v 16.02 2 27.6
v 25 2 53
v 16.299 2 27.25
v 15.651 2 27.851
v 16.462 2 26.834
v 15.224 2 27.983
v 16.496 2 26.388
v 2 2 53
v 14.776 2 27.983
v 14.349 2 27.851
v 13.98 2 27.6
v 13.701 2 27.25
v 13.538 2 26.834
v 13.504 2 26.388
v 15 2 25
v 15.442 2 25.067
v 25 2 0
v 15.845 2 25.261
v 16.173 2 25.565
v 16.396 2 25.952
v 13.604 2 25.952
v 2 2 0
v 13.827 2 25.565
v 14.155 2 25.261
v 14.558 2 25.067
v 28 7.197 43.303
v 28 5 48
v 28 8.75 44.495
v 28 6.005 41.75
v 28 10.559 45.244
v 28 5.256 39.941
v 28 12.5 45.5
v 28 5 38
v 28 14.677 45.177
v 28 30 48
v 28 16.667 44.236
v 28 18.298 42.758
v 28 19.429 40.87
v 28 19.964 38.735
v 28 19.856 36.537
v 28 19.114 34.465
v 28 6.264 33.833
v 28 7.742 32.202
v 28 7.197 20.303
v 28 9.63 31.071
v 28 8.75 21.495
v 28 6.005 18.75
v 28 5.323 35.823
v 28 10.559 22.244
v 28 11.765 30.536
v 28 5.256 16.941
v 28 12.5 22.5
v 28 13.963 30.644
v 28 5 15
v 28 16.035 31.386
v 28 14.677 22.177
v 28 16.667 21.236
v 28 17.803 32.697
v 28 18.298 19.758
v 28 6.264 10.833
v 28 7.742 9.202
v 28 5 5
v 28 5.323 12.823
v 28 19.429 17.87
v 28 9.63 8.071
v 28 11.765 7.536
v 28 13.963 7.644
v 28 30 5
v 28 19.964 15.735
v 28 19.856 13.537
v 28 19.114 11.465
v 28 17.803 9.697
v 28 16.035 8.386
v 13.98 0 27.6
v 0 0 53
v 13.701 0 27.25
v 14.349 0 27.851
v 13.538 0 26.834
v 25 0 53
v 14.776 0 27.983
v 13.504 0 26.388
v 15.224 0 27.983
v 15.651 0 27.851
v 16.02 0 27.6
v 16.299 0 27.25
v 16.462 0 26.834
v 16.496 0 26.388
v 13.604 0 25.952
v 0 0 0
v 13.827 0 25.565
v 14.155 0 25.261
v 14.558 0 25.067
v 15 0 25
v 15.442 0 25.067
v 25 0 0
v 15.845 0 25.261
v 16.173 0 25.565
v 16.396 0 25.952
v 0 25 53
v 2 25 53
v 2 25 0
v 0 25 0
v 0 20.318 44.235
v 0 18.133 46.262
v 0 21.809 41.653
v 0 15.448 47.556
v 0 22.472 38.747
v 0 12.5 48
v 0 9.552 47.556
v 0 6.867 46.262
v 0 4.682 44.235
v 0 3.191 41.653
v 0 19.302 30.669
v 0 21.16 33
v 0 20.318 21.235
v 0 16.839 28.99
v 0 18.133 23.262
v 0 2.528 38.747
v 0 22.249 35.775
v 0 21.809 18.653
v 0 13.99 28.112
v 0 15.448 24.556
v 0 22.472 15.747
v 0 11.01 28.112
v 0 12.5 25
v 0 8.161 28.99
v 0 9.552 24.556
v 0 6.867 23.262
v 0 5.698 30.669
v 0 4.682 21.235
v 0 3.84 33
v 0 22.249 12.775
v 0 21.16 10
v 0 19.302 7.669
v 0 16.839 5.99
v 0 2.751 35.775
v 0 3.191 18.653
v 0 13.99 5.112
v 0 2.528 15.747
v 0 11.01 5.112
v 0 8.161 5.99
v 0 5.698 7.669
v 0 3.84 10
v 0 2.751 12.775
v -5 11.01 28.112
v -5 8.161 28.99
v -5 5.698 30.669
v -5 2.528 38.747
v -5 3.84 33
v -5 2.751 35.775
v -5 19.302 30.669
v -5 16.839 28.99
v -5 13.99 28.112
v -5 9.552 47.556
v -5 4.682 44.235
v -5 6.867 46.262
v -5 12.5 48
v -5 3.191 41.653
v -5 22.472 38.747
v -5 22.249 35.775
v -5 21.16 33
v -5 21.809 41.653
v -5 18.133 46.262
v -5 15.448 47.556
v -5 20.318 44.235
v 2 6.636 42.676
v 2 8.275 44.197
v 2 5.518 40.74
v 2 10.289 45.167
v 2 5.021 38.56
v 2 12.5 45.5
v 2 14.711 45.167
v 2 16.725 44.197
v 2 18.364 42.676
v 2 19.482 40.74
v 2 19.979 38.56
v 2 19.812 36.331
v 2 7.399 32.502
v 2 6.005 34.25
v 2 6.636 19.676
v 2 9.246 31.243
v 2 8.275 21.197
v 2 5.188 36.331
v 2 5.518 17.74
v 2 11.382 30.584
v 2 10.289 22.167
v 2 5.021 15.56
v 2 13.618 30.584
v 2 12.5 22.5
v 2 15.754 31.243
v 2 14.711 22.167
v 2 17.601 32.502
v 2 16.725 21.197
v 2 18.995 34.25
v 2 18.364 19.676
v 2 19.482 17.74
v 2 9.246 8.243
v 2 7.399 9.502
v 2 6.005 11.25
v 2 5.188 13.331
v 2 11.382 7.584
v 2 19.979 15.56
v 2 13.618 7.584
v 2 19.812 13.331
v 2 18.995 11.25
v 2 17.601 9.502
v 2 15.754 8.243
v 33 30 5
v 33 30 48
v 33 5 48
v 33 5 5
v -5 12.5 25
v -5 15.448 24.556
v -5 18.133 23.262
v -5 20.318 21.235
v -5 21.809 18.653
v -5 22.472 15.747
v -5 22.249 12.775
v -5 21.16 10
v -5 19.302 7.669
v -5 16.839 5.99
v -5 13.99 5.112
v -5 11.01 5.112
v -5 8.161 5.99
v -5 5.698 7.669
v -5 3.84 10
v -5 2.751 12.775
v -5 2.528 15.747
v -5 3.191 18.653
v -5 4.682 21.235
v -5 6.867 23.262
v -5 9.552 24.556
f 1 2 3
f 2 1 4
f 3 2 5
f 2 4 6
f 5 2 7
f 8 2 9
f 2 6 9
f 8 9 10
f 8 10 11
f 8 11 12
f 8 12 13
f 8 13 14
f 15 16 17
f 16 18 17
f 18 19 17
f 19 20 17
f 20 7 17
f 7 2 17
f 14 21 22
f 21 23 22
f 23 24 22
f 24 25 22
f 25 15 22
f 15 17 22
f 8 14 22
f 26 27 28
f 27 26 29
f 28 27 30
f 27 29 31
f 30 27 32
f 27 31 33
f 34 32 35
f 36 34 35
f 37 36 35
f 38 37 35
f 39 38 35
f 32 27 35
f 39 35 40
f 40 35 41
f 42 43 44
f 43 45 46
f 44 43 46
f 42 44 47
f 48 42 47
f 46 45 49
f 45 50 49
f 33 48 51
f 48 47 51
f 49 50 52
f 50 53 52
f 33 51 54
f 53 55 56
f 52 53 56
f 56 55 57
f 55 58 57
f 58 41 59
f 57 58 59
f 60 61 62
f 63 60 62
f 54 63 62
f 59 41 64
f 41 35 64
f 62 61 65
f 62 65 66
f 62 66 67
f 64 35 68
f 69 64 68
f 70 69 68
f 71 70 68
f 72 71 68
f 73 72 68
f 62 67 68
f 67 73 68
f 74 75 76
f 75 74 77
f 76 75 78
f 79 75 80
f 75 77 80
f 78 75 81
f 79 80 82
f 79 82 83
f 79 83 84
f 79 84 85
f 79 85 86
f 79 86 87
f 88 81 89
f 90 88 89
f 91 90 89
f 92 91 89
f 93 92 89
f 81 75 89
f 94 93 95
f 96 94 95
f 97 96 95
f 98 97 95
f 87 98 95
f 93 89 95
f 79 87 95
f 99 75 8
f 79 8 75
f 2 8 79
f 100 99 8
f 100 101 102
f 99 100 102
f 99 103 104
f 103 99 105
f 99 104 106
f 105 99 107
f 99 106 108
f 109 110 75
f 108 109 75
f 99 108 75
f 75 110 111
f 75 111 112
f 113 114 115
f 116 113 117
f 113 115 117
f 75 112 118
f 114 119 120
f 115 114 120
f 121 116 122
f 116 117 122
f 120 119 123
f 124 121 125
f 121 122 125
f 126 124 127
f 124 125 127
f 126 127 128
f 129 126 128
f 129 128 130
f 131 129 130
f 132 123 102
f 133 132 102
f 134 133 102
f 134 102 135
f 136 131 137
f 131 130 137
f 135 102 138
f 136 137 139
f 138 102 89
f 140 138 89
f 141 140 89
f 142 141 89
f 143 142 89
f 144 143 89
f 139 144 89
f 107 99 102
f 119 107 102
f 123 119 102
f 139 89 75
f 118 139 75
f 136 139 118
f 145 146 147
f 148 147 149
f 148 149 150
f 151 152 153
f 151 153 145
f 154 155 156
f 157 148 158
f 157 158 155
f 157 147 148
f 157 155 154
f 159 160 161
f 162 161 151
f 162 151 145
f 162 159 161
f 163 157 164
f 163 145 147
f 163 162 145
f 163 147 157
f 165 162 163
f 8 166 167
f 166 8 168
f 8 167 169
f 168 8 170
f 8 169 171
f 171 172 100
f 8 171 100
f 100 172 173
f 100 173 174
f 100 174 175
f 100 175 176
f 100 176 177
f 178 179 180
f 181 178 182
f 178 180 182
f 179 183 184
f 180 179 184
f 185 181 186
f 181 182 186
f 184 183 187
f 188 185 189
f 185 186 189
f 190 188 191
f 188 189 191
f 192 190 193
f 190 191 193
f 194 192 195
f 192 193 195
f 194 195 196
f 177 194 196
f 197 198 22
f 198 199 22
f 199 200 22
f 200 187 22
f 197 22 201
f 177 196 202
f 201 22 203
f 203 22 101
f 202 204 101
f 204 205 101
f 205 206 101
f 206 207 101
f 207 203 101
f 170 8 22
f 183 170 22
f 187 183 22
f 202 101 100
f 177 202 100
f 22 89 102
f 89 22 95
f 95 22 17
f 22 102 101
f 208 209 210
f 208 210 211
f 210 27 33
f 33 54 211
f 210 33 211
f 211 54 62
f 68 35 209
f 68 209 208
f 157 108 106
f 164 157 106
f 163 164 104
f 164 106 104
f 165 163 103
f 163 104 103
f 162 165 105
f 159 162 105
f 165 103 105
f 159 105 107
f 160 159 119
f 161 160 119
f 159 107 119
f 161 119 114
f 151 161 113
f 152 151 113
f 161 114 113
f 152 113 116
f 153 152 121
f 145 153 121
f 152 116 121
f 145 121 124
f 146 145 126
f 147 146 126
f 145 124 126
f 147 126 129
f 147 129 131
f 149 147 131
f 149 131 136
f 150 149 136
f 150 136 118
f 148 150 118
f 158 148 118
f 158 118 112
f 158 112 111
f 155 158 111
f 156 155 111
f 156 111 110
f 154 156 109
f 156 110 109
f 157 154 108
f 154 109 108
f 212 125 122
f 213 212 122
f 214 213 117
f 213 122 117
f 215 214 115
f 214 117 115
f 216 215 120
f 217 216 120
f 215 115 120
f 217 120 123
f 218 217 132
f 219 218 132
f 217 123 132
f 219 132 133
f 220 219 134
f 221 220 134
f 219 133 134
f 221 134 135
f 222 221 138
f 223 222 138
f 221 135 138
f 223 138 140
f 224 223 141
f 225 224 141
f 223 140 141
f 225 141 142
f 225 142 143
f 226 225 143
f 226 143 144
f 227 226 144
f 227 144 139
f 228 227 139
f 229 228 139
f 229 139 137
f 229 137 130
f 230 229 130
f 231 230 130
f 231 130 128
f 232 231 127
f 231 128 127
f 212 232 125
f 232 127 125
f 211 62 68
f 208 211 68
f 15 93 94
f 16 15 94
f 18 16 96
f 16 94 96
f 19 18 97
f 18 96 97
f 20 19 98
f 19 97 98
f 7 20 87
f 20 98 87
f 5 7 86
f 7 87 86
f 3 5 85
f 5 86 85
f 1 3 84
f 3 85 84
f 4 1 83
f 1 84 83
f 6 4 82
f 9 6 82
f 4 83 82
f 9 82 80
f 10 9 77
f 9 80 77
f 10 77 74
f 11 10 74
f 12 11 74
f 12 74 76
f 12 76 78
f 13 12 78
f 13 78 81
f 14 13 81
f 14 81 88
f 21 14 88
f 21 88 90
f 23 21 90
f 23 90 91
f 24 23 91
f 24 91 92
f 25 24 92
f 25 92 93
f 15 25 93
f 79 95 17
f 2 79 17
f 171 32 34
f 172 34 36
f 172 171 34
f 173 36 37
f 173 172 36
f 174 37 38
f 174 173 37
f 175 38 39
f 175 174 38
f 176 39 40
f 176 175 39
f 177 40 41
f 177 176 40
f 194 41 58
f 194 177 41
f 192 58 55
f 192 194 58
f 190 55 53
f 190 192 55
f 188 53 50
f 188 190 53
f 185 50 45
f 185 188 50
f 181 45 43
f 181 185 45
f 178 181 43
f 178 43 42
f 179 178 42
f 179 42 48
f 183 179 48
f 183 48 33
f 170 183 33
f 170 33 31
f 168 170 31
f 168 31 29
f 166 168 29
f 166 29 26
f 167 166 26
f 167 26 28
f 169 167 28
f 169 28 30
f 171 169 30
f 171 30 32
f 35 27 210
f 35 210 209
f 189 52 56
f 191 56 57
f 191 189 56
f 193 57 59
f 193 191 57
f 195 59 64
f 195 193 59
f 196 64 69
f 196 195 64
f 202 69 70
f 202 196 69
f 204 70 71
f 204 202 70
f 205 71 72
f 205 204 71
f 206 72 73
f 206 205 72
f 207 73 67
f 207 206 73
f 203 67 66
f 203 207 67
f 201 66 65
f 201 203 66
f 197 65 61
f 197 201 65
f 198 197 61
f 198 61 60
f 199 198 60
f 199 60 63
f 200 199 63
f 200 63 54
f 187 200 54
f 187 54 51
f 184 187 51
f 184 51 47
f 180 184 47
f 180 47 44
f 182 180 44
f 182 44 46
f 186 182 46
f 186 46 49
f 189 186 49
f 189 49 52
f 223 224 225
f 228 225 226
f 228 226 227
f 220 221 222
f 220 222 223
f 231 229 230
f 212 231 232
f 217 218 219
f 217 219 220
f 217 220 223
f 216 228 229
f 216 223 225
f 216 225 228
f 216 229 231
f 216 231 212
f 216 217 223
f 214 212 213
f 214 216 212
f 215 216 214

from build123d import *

# Parameters (mm, degrees)
EXTRUDE_THIN1_DEPTH = 53
SKETCH2_R           = 10
BOSS_EXTRUDE1_DEPTH = 5
SKETCH4_R           = 7.5
BOSS_EXTRUDE2_DEPTH = 33
SKETCH5_W           = 43
SKETCH5_H           = 25
BOSS_EXTRUDE3_DEPTH = 5
SKETCH6_R           = 1.5
CUT_EXTRUDE1_DEPTH  = 5


with BuildPart() as part:
    # Sketch1 → Extrude-Thin1 (new body)
    with BuildSketch(Plane.XY):
        Polygon((0, 25), (0, 0), (25, 0), (25, 2), (2, 2), (2, 25), align=None)
    extrude(amount=EXTRUDE_THIN1_DEPTH)

    # Sketch2 → Boss-Extrude1 (add)
    with BuildSketch(Plane.ZY):
        with Locations((15, 12.5)):
            Circle(SKETCH2_R)
        with Locations((38, 12.5)):
            Circle(SKETCH2_R)
    extrude(amount=BOSS_EXTRUDE1_DEPTH)

    # Sketch4 → Boss-Extrude2 (add)
    with BuildSketch(Plane.ZY.offset(5)):
        with Locations((38, 12.5)):
            Circle(SKETCH4_R)
        with Locations((15, 12.5)):
            Circle(SKETCH4_R)
    extrude(amount=-BOSS_EXTRUDE2_DEPTH)

    # Sketch5 → Boss-Extrude3 (add)
    with BuildSketch(Plane(origin=(28, 0, 0), x_dir=(0, 0, -1), z_dir=(1, 0, 0))):
        with Locations((-26.5, 17.5)):
            Rectangle(SKETCH5_W, SKETCH5_H)
    extrude(amount=BOSS_EXTRUDE3_DEPTH)

    # Sketch6 → Cut-Extrude1 (cut)
    with BuildSketch(Plane.XZ):
        with Locations(Location((15, 26.5, 0), (0, 0, 270))):
            Circle(SKETCH6_R)
    extrude(amount=-CUT_EXTRUDE1_DEPTH, mode=Mode.SUBTRACT)


solid = part.part
